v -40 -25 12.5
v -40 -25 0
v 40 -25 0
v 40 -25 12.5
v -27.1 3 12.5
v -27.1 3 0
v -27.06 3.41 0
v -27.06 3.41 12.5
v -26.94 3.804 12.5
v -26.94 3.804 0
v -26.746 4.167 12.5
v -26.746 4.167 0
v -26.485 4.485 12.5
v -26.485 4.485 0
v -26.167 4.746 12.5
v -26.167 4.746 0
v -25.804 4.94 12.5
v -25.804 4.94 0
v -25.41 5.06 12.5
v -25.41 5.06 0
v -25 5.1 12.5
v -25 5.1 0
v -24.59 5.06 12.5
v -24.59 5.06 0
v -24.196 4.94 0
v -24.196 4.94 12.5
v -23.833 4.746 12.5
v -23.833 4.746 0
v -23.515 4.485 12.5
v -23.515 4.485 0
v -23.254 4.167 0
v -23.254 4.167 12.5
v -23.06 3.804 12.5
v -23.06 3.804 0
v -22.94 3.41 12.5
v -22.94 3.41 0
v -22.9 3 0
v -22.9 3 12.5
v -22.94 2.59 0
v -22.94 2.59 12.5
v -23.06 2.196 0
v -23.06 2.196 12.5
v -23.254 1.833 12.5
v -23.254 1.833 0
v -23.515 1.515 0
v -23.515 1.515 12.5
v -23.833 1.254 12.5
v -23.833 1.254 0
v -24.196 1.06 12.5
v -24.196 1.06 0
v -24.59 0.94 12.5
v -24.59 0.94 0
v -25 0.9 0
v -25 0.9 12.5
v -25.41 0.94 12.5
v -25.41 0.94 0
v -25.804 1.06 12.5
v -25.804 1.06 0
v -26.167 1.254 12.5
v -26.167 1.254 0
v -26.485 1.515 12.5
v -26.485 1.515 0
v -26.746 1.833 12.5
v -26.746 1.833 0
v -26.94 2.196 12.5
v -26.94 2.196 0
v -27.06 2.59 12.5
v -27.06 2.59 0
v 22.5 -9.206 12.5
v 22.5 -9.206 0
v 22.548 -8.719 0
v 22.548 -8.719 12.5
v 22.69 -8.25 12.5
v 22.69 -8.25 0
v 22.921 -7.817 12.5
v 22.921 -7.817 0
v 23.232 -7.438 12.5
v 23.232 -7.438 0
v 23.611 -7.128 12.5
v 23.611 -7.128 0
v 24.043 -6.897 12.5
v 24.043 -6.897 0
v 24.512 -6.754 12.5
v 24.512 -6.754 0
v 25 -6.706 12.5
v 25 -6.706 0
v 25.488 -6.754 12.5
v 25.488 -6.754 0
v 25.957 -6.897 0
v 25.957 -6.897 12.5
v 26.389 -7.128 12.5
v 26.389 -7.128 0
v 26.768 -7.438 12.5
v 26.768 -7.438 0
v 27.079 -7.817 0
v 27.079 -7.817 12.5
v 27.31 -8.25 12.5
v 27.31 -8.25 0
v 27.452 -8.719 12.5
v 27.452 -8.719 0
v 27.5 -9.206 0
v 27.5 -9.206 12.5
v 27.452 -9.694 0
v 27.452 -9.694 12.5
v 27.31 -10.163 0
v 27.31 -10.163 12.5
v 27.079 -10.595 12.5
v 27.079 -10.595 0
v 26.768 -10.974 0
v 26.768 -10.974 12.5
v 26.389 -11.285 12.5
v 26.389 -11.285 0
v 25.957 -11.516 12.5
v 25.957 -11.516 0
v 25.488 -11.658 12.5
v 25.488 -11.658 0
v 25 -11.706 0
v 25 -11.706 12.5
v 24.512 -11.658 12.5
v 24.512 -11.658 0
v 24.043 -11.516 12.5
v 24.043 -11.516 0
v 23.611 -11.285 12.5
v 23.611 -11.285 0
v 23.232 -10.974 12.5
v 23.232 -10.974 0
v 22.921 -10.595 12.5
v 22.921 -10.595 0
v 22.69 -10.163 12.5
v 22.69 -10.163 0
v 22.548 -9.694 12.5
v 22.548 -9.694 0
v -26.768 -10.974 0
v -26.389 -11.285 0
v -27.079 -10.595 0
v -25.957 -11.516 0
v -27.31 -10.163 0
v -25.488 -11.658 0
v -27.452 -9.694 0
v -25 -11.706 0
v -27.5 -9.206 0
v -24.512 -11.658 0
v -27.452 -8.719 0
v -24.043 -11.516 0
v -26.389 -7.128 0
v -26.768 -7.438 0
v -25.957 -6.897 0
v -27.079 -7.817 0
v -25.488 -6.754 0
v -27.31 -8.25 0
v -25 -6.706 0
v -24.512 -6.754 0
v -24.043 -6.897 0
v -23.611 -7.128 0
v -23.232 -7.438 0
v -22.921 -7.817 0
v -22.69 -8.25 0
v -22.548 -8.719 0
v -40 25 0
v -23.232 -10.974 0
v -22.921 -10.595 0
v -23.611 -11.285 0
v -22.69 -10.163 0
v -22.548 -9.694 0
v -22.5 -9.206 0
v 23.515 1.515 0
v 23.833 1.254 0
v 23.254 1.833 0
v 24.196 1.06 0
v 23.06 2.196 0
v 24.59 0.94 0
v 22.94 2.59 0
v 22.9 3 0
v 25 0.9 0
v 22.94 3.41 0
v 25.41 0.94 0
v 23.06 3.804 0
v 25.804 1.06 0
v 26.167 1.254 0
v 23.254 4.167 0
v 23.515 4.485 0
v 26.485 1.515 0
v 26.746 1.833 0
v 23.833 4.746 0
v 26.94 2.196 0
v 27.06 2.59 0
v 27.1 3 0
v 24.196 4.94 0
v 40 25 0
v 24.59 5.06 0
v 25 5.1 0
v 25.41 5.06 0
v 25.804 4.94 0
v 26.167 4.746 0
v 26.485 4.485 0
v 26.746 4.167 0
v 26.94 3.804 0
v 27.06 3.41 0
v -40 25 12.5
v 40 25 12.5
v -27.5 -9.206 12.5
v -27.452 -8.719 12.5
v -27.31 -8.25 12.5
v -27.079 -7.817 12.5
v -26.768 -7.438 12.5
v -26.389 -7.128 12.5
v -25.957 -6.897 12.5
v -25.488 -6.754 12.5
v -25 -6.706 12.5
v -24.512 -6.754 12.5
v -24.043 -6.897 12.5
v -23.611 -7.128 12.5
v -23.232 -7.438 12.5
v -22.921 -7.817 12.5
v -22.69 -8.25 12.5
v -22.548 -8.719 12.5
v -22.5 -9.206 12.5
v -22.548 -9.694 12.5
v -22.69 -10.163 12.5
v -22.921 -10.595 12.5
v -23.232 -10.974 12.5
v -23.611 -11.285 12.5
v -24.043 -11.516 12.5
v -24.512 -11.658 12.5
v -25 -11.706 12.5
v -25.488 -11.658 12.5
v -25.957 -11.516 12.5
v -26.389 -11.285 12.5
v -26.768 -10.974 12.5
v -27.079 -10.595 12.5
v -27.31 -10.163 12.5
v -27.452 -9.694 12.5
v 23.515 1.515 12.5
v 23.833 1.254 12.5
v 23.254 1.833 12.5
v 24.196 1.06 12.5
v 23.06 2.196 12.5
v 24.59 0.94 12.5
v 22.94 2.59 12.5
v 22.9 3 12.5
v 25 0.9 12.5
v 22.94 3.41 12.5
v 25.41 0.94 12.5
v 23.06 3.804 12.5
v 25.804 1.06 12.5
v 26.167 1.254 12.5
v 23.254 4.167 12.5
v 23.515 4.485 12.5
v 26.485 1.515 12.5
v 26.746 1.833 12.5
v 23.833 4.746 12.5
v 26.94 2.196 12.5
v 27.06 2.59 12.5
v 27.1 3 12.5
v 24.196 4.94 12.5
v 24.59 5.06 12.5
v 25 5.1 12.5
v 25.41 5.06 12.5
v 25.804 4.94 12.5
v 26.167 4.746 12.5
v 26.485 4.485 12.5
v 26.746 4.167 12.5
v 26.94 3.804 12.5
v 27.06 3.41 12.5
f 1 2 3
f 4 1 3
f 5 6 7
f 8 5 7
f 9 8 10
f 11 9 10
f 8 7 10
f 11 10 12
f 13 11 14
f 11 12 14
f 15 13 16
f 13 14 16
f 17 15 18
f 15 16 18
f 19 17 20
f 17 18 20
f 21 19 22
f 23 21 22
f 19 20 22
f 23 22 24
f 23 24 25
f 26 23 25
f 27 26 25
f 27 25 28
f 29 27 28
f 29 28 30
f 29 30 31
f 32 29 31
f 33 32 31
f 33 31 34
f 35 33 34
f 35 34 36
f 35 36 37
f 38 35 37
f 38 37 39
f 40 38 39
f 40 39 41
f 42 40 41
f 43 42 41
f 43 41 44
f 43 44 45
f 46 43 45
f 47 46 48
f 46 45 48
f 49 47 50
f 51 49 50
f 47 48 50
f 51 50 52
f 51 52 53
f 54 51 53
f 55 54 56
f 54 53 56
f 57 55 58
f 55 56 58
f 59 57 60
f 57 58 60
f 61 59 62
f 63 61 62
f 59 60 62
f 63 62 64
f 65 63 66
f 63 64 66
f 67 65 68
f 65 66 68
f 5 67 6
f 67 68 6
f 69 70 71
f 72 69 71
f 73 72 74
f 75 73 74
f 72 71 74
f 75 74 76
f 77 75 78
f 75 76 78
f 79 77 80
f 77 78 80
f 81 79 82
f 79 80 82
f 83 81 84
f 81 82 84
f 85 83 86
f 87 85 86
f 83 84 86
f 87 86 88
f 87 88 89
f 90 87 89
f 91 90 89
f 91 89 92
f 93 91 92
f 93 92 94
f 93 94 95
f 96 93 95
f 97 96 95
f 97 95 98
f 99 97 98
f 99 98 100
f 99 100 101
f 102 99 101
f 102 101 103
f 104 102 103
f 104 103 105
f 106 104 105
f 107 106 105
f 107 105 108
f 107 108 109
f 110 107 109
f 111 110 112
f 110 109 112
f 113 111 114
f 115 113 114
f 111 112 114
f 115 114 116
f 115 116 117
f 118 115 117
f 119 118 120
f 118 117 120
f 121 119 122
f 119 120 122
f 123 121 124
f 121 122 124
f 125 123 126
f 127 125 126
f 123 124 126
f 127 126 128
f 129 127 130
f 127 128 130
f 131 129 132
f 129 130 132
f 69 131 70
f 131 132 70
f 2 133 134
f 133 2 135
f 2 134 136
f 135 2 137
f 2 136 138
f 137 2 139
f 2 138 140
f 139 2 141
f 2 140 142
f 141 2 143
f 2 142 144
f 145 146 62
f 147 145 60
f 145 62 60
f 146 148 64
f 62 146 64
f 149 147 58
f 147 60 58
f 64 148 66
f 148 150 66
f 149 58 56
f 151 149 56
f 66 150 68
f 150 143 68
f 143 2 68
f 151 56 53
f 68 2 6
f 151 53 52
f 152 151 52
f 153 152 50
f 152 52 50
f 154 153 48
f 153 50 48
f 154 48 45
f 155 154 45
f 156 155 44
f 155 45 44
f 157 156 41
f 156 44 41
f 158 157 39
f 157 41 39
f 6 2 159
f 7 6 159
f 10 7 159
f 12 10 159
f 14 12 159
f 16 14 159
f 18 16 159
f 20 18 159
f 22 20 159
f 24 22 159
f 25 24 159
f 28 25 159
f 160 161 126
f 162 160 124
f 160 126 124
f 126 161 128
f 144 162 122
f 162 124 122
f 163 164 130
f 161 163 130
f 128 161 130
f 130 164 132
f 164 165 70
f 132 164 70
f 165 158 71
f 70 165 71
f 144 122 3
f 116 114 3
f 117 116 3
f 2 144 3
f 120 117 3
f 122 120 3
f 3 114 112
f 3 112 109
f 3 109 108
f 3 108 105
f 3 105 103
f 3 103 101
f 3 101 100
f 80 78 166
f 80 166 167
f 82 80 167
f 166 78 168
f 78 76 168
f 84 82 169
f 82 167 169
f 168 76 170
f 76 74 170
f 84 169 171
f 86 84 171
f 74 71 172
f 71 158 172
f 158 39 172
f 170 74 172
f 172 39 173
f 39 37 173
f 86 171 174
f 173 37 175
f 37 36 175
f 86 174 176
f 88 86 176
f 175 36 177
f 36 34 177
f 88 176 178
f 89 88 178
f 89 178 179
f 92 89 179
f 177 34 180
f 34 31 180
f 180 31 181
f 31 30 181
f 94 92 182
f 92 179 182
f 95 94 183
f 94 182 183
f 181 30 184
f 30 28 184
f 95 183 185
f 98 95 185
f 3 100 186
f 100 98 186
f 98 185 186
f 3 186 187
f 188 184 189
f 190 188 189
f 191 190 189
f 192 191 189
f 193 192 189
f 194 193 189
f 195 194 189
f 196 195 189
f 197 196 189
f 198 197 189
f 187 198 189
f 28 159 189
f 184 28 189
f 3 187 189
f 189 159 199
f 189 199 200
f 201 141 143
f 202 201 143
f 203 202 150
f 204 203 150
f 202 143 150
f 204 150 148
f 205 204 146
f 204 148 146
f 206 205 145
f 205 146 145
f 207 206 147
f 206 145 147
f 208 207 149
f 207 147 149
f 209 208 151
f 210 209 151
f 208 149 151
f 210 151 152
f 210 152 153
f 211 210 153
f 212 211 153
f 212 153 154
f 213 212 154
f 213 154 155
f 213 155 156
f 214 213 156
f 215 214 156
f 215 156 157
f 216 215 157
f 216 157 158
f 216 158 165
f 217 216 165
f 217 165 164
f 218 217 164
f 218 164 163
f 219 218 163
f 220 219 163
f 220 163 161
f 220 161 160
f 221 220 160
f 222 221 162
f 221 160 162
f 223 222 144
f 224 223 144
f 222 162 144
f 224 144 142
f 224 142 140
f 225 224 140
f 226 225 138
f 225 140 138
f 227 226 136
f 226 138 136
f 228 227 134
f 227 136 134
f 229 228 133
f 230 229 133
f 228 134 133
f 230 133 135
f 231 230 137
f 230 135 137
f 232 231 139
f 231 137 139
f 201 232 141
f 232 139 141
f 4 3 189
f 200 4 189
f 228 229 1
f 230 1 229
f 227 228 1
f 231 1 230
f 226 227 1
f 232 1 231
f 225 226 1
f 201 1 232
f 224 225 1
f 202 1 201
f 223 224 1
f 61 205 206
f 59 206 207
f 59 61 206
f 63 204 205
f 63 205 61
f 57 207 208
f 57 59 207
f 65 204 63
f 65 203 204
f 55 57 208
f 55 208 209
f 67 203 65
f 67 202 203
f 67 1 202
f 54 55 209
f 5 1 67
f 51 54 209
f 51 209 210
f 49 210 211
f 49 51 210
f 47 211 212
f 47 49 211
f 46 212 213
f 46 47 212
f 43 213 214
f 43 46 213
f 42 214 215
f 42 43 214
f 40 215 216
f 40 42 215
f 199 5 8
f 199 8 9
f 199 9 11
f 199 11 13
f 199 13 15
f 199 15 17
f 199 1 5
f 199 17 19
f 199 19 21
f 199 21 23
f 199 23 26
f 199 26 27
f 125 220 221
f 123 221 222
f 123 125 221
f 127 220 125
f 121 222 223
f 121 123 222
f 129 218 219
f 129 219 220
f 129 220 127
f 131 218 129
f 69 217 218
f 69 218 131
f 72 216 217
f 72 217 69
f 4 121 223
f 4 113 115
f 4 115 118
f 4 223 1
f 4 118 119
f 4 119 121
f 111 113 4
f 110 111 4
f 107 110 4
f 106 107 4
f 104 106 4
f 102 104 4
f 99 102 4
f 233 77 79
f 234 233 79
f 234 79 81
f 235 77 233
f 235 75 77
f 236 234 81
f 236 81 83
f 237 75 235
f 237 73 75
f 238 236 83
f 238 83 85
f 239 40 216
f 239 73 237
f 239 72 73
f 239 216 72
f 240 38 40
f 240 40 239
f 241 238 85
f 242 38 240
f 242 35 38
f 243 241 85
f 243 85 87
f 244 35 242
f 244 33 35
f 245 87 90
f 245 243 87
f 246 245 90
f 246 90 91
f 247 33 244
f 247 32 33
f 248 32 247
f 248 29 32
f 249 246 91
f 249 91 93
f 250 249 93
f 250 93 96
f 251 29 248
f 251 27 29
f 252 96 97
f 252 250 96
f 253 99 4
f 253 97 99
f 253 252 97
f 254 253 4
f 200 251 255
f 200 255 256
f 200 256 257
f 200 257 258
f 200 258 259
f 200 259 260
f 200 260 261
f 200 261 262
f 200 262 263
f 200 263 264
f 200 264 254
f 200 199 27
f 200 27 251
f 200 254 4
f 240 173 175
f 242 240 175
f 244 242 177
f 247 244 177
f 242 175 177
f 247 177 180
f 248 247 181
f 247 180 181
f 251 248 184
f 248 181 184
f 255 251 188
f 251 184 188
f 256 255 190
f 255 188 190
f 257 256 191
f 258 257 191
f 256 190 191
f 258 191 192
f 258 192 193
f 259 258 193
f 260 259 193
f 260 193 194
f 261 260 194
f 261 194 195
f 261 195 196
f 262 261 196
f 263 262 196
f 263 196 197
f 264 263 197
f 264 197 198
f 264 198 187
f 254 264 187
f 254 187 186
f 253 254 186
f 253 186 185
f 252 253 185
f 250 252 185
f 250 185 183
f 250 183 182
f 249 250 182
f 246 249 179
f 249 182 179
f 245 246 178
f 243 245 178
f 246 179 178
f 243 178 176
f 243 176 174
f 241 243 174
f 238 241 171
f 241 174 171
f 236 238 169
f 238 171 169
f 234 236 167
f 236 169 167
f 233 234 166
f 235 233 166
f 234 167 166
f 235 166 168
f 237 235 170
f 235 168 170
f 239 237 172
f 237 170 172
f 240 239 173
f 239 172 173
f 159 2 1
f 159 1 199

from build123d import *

# Parameters (mm, degrees)
SKETCH1_W             = 80
SKETCH1_H             = 50
EXTRUDE1_DEPTH        = 12.5
M6_TAPPED_HOLE1_D     = 5
M5_TAPPED_HOLE1_D     = 4.2
M5_TAPPED_HOLE1_DEPTH = 12.5


with BuildPart() as part:
    # Sketch1 → Extrude1 (new body)
    with BuildSketch(Plane.XY):
        Rectangle(SKETCH1_W, SKETCH1_H)
    extrude(amount=EXTRUDE1_DEPTH)

    # M6 Tapped Hole1 (through all)
    with Locations(Plane.XY.offset(12.5)):
        with Locations((-25, -9.206258577), (25, -9.206258577)):
            Hole(M6_TAPPED_HOLE1_D / 2)

    # M5 Tapped Hole1
    with Locations(Plane.XY.offset(12.5)):
        with Locations((-25, 3), (25, 3)):
            Hole(M5_TAPPED_HOLE1_D / 2, depth=M5_TAPPED_HOLE1_DEPTH)


solid = part.part
